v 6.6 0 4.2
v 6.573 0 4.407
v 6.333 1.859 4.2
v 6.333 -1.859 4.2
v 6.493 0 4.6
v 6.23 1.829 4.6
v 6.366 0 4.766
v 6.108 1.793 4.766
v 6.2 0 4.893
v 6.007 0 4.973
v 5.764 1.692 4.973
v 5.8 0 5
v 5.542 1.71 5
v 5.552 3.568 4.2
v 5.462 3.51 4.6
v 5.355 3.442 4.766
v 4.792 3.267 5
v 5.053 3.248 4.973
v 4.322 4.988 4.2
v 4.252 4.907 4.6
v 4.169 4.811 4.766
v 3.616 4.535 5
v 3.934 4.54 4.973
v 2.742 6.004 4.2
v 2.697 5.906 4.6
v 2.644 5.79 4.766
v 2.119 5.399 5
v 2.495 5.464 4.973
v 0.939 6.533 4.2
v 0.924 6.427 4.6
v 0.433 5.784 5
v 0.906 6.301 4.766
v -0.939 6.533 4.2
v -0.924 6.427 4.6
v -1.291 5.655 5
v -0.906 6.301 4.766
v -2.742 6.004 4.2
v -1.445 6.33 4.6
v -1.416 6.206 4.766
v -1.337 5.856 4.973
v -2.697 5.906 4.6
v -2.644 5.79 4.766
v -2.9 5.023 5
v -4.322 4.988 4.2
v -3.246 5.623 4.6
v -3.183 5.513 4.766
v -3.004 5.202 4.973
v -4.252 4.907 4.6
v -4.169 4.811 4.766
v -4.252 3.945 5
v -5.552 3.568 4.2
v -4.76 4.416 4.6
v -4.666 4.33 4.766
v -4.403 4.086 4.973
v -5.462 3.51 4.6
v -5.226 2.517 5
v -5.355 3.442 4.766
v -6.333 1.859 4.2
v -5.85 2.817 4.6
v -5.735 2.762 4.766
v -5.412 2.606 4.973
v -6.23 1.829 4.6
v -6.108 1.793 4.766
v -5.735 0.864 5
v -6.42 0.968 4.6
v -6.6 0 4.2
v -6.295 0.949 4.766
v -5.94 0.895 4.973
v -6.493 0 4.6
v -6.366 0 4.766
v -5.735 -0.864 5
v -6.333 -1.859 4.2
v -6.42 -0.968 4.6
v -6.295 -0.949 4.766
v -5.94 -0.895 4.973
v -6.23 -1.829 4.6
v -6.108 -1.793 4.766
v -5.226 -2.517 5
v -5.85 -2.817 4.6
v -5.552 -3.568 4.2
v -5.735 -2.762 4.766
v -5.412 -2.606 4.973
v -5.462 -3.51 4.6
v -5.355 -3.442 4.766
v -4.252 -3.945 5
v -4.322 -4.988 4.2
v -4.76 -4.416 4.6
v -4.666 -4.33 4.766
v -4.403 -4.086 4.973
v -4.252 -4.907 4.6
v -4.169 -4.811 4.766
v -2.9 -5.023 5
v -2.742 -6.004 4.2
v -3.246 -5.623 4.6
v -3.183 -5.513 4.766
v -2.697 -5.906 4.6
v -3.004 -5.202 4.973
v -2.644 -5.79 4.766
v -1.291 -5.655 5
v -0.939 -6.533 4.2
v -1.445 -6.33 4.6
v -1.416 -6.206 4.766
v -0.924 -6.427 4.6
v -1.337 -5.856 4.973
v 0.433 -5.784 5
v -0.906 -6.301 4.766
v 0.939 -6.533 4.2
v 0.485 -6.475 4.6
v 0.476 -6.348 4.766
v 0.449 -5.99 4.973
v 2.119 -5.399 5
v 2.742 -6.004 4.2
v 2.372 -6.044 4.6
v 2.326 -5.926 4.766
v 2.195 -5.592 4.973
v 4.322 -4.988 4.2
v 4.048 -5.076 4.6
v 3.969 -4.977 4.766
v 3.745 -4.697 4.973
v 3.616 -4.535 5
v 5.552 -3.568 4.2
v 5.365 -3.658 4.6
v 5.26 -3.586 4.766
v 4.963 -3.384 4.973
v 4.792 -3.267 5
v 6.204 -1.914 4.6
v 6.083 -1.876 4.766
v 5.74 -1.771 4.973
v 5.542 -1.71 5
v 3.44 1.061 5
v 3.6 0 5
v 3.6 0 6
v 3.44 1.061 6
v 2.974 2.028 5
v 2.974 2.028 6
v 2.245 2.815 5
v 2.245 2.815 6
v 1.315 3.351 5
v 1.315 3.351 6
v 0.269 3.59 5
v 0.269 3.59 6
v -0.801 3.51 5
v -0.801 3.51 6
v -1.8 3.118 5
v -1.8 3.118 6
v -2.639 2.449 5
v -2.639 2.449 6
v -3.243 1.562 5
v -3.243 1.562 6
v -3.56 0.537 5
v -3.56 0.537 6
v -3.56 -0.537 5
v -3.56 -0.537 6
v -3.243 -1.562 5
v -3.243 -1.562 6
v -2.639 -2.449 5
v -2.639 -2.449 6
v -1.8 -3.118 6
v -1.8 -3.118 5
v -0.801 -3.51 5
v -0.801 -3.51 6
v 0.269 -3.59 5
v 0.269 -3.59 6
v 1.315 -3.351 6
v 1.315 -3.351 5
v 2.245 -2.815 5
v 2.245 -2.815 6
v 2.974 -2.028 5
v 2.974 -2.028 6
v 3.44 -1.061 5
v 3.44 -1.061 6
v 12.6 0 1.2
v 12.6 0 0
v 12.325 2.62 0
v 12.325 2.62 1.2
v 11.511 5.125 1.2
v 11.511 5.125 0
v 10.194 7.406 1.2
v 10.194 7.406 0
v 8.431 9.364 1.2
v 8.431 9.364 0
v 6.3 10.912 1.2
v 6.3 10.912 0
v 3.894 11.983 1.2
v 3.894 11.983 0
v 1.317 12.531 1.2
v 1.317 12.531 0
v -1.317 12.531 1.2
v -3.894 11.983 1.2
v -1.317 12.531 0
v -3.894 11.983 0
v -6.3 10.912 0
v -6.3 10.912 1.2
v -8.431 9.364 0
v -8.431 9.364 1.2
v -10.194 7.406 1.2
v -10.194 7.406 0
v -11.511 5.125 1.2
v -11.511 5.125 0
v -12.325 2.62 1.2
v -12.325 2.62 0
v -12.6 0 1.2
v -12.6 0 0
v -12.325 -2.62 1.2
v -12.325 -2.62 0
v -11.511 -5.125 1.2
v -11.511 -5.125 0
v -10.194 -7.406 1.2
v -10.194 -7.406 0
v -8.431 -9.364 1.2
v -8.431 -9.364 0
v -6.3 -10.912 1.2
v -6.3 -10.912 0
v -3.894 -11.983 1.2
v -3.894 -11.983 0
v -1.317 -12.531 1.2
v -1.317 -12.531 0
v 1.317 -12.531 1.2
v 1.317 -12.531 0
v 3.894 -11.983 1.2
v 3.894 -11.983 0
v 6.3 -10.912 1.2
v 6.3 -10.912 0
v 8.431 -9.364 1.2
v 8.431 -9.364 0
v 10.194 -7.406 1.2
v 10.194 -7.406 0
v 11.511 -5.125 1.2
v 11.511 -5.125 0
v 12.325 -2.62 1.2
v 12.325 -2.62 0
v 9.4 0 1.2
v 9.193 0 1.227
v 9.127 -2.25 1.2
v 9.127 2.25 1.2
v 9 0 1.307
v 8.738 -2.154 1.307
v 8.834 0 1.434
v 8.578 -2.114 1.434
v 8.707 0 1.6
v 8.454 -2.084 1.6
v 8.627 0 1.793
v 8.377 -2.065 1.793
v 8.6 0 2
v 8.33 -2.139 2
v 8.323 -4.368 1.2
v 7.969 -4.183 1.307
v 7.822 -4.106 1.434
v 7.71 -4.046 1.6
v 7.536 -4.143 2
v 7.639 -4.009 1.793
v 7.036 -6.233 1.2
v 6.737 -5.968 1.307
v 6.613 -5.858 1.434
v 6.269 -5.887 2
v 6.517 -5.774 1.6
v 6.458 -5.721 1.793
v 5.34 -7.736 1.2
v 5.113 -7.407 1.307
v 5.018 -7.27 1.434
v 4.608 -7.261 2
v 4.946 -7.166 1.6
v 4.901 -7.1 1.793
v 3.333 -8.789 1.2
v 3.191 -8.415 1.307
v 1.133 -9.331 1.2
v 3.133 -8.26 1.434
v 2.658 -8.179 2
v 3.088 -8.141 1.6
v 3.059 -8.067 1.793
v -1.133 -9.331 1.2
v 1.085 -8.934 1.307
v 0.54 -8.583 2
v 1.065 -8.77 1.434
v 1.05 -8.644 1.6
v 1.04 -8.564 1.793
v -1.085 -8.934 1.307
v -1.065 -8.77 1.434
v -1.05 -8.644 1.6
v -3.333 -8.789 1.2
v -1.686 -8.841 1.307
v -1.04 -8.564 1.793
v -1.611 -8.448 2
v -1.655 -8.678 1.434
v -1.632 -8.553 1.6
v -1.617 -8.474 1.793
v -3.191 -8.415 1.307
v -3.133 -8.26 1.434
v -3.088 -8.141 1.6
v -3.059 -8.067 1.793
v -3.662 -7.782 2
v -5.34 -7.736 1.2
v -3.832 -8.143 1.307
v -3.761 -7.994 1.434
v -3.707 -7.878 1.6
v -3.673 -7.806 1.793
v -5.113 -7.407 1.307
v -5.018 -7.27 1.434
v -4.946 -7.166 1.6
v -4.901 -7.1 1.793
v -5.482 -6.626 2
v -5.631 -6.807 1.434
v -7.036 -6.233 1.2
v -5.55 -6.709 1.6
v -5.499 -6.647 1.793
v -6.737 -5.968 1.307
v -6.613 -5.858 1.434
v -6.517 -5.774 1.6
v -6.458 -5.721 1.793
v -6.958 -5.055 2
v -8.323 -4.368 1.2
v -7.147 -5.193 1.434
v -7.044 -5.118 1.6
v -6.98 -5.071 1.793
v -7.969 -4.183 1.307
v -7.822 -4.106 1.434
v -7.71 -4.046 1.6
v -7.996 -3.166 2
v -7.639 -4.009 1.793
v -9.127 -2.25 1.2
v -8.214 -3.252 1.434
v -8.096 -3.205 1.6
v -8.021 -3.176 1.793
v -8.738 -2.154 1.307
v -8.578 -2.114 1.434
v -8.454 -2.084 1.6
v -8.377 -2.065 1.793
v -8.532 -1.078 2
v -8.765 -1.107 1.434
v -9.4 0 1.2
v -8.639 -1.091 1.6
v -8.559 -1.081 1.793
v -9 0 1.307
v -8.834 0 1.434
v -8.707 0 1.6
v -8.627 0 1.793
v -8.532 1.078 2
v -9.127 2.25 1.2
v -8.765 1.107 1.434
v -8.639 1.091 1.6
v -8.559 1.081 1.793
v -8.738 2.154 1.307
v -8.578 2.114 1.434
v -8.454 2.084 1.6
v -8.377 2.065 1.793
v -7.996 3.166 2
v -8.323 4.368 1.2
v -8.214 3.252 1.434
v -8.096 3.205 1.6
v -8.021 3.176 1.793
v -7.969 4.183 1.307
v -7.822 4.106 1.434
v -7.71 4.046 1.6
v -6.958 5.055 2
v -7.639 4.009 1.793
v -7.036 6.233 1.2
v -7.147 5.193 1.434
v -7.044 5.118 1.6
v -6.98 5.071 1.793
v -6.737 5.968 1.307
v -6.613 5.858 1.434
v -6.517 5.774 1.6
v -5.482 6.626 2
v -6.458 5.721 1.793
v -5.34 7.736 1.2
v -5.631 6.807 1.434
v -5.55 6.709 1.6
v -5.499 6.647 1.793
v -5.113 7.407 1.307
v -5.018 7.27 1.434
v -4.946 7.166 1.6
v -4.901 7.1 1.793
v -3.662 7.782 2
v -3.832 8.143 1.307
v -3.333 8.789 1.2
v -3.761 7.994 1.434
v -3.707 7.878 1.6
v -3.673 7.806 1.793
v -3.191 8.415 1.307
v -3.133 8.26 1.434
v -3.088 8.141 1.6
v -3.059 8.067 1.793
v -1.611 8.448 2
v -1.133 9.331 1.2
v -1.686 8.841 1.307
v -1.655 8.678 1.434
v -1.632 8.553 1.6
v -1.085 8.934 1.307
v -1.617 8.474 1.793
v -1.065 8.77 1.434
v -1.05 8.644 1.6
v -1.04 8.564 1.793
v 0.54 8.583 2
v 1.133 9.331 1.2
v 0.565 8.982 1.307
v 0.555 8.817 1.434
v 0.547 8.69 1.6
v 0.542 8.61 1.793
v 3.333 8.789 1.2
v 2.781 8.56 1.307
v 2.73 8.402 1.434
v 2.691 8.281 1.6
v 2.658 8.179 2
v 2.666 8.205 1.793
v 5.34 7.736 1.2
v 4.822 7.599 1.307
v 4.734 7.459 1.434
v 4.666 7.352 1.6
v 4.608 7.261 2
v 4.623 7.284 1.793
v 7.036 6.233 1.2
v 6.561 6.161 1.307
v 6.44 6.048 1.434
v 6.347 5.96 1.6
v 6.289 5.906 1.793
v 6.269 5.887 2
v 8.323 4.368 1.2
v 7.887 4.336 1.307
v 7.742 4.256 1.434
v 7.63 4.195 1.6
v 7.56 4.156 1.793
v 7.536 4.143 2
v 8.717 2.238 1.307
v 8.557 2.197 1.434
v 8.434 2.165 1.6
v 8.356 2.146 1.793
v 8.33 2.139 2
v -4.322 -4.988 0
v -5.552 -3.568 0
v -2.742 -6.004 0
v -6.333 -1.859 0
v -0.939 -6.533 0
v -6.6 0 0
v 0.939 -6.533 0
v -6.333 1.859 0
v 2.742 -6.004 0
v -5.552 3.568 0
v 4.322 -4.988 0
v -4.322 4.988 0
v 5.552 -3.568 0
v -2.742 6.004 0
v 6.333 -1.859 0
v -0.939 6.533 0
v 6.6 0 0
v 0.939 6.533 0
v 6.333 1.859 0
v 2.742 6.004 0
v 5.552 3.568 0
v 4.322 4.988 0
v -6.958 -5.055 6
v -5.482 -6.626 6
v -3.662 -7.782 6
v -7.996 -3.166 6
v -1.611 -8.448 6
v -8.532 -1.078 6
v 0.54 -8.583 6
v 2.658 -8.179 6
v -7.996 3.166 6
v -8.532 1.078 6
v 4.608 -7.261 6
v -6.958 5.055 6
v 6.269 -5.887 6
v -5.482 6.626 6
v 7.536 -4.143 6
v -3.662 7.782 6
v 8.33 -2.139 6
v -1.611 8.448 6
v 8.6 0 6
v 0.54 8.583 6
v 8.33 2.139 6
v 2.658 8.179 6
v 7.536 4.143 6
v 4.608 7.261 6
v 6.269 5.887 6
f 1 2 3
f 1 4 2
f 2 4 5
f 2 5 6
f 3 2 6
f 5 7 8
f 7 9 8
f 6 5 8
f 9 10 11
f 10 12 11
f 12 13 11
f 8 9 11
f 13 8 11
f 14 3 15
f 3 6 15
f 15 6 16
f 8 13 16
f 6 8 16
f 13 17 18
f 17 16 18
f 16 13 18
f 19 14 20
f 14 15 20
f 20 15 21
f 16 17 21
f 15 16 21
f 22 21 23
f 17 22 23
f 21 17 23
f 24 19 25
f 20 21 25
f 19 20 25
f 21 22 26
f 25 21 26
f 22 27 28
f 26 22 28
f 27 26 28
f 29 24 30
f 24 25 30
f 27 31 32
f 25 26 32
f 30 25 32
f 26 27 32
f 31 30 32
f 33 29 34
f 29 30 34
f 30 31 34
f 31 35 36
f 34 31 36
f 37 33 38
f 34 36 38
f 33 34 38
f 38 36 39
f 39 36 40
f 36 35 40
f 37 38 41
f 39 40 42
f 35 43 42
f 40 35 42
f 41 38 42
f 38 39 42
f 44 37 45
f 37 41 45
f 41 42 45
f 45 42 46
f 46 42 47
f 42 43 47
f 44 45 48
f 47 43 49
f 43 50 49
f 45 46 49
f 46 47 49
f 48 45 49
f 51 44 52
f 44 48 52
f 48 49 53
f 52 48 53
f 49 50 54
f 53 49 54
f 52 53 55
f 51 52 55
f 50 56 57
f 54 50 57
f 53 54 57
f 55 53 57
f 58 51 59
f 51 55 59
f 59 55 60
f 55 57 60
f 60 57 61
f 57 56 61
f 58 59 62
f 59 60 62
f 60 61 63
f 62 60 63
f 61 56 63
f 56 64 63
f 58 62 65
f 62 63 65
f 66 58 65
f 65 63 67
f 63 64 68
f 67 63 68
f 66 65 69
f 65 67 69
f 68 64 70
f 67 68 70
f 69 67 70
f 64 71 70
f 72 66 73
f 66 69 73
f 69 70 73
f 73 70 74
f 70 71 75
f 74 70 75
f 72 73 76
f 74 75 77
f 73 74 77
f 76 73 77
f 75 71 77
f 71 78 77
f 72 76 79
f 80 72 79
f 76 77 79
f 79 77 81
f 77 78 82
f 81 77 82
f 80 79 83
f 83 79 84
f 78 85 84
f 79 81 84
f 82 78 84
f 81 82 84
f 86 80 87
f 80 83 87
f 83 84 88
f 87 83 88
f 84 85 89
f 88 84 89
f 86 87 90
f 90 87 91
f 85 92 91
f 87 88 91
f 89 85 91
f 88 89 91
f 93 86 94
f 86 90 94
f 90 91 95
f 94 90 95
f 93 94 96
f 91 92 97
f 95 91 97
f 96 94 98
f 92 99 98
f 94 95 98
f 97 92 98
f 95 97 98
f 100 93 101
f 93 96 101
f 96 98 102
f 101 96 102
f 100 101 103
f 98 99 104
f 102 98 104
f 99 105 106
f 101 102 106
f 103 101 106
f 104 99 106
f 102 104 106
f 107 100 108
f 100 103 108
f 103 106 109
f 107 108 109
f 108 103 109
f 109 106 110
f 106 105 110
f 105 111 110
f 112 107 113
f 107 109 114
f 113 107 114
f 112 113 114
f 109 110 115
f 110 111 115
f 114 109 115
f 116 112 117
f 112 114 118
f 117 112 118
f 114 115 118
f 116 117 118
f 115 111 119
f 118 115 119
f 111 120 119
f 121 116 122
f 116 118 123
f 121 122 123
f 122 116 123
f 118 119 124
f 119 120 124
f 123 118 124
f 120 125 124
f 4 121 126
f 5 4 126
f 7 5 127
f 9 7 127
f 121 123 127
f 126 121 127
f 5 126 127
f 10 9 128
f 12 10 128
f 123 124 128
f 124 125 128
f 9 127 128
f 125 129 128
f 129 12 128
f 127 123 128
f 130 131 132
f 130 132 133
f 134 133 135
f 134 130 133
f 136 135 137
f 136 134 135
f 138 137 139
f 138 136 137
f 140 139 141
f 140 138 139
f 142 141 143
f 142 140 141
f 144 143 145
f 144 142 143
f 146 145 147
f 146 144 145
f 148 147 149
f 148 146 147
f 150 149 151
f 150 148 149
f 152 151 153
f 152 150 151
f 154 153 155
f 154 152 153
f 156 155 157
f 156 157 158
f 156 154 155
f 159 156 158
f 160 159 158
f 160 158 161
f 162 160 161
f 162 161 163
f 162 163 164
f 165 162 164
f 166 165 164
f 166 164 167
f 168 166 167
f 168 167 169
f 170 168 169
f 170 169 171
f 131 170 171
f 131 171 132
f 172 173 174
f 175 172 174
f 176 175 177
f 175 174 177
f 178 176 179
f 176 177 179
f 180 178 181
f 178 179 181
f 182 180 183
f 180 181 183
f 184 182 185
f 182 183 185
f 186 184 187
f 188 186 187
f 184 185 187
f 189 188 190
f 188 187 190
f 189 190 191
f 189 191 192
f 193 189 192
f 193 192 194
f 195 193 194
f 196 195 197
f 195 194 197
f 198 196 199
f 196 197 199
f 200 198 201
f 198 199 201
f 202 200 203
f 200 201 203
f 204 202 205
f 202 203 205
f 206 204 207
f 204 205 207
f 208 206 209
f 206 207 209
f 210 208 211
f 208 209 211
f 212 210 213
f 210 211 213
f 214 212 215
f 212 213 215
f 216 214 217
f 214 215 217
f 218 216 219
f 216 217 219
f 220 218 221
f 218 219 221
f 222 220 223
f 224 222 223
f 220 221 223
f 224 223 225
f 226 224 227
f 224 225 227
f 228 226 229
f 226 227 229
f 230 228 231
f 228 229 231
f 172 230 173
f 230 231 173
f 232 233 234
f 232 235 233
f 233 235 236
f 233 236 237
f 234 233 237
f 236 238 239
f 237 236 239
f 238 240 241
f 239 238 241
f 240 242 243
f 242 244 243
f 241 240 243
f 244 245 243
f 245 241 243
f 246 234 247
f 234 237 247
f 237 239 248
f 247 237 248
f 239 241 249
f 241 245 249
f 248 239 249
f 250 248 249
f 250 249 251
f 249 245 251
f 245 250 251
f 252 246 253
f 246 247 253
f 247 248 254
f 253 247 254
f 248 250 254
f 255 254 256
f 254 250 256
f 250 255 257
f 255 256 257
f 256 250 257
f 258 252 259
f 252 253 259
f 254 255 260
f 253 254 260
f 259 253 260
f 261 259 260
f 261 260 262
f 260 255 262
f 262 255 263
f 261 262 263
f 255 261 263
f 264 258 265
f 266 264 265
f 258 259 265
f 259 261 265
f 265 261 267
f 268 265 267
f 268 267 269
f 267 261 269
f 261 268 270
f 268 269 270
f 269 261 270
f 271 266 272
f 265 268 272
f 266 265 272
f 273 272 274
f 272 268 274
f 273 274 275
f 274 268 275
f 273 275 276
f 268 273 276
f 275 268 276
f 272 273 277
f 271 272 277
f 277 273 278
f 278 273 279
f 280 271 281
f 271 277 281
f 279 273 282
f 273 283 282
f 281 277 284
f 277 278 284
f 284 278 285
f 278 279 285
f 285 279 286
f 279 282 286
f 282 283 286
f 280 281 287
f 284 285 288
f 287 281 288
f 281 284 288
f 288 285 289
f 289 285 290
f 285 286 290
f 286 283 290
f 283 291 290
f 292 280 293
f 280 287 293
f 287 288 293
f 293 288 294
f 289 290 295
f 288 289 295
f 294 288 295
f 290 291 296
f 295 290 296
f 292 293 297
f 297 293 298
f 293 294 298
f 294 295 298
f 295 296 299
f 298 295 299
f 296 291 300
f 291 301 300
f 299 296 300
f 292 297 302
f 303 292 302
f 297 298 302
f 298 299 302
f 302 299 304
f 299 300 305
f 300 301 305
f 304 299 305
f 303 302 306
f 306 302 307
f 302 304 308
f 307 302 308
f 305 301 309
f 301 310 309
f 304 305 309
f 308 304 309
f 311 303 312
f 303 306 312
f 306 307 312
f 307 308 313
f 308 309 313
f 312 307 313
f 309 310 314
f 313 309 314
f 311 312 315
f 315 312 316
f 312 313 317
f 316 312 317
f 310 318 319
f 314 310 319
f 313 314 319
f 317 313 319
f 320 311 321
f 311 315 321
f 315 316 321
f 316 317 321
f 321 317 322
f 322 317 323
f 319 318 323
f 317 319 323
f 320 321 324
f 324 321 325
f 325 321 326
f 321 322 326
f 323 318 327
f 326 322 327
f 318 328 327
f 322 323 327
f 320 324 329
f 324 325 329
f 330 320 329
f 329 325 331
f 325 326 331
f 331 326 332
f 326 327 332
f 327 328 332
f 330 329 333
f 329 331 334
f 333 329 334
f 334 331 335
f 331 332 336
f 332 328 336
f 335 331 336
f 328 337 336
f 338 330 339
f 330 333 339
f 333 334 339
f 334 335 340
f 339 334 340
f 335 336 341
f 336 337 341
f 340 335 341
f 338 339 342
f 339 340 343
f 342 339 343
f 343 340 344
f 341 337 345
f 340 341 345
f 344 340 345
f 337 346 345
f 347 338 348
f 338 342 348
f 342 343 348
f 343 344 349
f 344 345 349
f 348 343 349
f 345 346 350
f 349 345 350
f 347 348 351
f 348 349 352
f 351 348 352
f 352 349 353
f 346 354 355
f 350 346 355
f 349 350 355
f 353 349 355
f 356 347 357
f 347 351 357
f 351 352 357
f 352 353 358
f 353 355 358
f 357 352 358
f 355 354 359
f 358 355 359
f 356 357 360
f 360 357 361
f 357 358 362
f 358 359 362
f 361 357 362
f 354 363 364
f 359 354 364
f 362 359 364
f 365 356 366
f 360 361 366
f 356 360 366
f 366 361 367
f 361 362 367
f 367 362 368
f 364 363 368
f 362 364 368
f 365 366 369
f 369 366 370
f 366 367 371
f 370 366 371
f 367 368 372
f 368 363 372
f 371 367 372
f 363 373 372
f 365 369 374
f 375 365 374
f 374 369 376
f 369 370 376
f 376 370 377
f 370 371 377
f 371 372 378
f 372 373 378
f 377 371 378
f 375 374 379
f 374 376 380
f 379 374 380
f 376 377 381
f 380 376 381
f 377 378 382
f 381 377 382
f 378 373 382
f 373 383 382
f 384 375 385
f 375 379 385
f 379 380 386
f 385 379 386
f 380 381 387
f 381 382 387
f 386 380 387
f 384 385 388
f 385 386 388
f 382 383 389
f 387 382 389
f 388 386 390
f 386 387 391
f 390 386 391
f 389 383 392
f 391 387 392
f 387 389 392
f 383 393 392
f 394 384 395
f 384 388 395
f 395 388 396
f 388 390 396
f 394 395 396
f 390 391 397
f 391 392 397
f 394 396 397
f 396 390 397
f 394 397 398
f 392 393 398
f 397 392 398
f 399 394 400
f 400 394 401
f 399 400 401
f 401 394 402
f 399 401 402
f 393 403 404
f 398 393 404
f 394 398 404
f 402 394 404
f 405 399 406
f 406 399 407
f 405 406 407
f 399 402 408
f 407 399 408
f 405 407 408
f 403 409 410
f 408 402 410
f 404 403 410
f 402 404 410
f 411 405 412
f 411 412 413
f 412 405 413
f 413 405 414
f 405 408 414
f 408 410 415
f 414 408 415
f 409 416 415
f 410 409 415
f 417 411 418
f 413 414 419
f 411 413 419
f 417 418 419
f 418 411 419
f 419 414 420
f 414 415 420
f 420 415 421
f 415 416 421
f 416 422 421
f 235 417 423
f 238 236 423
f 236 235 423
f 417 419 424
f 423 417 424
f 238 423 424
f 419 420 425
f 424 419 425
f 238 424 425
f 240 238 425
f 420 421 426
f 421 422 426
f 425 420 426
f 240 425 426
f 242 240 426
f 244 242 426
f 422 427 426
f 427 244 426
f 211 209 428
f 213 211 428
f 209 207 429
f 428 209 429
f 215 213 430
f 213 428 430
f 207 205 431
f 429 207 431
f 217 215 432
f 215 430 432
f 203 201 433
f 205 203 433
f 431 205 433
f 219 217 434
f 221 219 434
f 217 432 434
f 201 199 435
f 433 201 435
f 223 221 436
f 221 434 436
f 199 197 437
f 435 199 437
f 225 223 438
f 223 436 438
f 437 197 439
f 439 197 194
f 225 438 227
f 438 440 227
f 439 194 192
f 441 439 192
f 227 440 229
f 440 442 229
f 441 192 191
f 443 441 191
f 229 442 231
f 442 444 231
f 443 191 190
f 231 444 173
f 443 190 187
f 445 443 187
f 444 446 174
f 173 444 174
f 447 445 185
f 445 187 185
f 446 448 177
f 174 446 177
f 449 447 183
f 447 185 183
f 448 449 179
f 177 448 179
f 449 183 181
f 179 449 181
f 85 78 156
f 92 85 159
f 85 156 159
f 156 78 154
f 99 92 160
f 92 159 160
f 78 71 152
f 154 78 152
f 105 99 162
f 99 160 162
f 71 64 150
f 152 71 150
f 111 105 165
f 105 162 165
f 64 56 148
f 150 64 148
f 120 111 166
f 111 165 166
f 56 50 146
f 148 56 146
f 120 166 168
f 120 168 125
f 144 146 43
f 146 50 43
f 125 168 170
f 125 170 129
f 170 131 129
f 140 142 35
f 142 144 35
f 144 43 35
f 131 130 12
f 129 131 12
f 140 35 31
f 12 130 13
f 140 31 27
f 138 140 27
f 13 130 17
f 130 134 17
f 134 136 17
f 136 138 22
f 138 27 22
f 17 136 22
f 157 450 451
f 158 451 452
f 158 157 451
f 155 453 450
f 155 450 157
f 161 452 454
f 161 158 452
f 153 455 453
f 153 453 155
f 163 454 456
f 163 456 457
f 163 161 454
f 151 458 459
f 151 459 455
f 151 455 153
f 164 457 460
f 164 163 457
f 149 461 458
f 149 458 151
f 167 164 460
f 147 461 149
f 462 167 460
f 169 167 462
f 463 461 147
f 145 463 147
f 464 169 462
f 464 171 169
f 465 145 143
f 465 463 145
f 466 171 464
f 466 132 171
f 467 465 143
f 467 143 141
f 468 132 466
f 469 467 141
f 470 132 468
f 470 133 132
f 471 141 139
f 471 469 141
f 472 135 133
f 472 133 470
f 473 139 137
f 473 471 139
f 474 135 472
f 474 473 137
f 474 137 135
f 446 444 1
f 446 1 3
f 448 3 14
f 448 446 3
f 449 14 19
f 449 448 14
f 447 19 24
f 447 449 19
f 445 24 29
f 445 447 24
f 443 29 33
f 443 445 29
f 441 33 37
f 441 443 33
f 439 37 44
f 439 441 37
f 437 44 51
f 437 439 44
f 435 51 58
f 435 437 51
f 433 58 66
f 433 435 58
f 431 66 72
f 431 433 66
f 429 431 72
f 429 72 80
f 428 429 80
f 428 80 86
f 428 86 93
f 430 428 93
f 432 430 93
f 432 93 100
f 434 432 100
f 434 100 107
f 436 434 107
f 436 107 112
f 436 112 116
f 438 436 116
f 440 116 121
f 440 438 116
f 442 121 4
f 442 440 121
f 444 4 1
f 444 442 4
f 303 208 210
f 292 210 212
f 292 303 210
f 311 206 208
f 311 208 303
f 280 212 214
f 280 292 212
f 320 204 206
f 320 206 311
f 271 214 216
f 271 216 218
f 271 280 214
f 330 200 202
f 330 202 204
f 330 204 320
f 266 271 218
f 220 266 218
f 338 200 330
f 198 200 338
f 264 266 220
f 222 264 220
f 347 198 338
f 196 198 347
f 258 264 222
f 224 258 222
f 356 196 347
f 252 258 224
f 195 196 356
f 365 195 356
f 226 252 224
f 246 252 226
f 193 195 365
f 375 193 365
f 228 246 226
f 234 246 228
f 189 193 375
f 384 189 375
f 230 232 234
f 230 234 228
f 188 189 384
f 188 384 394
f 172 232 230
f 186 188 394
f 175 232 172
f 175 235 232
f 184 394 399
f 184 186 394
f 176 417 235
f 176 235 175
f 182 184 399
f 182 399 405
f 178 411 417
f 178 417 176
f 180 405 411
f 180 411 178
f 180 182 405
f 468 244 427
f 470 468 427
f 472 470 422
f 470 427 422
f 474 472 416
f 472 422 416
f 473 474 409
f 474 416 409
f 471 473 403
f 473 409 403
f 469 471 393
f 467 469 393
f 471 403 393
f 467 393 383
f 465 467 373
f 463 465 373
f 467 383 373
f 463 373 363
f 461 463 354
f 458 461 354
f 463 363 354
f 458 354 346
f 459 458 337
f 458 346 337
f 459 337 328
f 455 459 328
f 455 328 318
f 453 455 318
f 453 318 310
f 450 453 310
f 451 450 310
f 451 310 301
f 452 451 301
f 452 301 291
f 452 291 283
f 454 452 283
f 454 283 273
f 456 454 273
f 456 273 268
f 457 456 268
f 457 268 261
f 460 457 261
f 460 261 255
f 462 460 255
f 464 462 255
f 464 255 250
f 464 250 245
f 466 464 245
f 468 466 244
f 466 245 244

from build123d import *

# Parameters (mm, degrees)
SKETCH1_R           = 12.6
BOSS_EXTRUDE1_DEPTH = 1.2
SKETCH1_3_R         = 8.6
SKETCH1_3_R_2       = 3.6
BOSS_EXTRUDE2_DEPTH = 6
SKETCH1_4_R         = 6.6
SKETCH1_4_R_2       = 3.6
CUT_EXTRUDE1_DEPTH  = 5
FILLET1_R           = 0.8
FILLET2_R           = 0.8


with BuildPart() as part:
    # Sketch1 → Boss-Extrude1 (new body)
    with BuildSketch(Plane.XY):
        Circle(SKETCH1_R)
    extrude(amount=BOSS_EXTRUDE1_DEPTH)

    # Sketch1<3> → Boss-Extrude2 (add)
    with BuildSketch(Plane.XY):
        Circle(SKETCH1_3_R)
        Circle(SKETCH1_3_R_2, mode=Mode.SUBTRACT)
    extrude(amount=BOSS_EXTRUDE2_DEPTH)

    # Sketch1<4> → Cut-Extrude1 (cut)
    with BuildSketch(Plane.XY):
        Circle(SKETCH1_4_R)
        Circle(SKETCH1_4_R_2, mode=Mode.SUBTRACT)
    extrude(amount=CUT_EXTRUDE1_DEPTH, mode=Mode.SUBTRACT)


with BuildPart() as cut_extrude1_kept_piece:
    # of the separate pieces the step leaves, the one the design keeps (cut_extrude1_pieces_kept)
    add(part.part.solids().sort_by_distance((12.6, 0, 0))[0])

    # Fillet1
    fillet1_edges = [cut_extrude1_kept_piece.edges().sort_by_distance(p)[0] for p in [
        (-6.6, 0, 5),
    ]]
    fillet(fillet1_edges, radius=FILLET1_R)

    # Fillet2
    fillet2_edges = [cut_extrude1_kept_piece.edges().sort_by_distance(p)[0] for p in [
        (-8.6, 0, 1.2),
    ]]
    fillet(fillet2_edges, radius=FILLET2_R)


solid = cut_extrude1_kept_piece.part
